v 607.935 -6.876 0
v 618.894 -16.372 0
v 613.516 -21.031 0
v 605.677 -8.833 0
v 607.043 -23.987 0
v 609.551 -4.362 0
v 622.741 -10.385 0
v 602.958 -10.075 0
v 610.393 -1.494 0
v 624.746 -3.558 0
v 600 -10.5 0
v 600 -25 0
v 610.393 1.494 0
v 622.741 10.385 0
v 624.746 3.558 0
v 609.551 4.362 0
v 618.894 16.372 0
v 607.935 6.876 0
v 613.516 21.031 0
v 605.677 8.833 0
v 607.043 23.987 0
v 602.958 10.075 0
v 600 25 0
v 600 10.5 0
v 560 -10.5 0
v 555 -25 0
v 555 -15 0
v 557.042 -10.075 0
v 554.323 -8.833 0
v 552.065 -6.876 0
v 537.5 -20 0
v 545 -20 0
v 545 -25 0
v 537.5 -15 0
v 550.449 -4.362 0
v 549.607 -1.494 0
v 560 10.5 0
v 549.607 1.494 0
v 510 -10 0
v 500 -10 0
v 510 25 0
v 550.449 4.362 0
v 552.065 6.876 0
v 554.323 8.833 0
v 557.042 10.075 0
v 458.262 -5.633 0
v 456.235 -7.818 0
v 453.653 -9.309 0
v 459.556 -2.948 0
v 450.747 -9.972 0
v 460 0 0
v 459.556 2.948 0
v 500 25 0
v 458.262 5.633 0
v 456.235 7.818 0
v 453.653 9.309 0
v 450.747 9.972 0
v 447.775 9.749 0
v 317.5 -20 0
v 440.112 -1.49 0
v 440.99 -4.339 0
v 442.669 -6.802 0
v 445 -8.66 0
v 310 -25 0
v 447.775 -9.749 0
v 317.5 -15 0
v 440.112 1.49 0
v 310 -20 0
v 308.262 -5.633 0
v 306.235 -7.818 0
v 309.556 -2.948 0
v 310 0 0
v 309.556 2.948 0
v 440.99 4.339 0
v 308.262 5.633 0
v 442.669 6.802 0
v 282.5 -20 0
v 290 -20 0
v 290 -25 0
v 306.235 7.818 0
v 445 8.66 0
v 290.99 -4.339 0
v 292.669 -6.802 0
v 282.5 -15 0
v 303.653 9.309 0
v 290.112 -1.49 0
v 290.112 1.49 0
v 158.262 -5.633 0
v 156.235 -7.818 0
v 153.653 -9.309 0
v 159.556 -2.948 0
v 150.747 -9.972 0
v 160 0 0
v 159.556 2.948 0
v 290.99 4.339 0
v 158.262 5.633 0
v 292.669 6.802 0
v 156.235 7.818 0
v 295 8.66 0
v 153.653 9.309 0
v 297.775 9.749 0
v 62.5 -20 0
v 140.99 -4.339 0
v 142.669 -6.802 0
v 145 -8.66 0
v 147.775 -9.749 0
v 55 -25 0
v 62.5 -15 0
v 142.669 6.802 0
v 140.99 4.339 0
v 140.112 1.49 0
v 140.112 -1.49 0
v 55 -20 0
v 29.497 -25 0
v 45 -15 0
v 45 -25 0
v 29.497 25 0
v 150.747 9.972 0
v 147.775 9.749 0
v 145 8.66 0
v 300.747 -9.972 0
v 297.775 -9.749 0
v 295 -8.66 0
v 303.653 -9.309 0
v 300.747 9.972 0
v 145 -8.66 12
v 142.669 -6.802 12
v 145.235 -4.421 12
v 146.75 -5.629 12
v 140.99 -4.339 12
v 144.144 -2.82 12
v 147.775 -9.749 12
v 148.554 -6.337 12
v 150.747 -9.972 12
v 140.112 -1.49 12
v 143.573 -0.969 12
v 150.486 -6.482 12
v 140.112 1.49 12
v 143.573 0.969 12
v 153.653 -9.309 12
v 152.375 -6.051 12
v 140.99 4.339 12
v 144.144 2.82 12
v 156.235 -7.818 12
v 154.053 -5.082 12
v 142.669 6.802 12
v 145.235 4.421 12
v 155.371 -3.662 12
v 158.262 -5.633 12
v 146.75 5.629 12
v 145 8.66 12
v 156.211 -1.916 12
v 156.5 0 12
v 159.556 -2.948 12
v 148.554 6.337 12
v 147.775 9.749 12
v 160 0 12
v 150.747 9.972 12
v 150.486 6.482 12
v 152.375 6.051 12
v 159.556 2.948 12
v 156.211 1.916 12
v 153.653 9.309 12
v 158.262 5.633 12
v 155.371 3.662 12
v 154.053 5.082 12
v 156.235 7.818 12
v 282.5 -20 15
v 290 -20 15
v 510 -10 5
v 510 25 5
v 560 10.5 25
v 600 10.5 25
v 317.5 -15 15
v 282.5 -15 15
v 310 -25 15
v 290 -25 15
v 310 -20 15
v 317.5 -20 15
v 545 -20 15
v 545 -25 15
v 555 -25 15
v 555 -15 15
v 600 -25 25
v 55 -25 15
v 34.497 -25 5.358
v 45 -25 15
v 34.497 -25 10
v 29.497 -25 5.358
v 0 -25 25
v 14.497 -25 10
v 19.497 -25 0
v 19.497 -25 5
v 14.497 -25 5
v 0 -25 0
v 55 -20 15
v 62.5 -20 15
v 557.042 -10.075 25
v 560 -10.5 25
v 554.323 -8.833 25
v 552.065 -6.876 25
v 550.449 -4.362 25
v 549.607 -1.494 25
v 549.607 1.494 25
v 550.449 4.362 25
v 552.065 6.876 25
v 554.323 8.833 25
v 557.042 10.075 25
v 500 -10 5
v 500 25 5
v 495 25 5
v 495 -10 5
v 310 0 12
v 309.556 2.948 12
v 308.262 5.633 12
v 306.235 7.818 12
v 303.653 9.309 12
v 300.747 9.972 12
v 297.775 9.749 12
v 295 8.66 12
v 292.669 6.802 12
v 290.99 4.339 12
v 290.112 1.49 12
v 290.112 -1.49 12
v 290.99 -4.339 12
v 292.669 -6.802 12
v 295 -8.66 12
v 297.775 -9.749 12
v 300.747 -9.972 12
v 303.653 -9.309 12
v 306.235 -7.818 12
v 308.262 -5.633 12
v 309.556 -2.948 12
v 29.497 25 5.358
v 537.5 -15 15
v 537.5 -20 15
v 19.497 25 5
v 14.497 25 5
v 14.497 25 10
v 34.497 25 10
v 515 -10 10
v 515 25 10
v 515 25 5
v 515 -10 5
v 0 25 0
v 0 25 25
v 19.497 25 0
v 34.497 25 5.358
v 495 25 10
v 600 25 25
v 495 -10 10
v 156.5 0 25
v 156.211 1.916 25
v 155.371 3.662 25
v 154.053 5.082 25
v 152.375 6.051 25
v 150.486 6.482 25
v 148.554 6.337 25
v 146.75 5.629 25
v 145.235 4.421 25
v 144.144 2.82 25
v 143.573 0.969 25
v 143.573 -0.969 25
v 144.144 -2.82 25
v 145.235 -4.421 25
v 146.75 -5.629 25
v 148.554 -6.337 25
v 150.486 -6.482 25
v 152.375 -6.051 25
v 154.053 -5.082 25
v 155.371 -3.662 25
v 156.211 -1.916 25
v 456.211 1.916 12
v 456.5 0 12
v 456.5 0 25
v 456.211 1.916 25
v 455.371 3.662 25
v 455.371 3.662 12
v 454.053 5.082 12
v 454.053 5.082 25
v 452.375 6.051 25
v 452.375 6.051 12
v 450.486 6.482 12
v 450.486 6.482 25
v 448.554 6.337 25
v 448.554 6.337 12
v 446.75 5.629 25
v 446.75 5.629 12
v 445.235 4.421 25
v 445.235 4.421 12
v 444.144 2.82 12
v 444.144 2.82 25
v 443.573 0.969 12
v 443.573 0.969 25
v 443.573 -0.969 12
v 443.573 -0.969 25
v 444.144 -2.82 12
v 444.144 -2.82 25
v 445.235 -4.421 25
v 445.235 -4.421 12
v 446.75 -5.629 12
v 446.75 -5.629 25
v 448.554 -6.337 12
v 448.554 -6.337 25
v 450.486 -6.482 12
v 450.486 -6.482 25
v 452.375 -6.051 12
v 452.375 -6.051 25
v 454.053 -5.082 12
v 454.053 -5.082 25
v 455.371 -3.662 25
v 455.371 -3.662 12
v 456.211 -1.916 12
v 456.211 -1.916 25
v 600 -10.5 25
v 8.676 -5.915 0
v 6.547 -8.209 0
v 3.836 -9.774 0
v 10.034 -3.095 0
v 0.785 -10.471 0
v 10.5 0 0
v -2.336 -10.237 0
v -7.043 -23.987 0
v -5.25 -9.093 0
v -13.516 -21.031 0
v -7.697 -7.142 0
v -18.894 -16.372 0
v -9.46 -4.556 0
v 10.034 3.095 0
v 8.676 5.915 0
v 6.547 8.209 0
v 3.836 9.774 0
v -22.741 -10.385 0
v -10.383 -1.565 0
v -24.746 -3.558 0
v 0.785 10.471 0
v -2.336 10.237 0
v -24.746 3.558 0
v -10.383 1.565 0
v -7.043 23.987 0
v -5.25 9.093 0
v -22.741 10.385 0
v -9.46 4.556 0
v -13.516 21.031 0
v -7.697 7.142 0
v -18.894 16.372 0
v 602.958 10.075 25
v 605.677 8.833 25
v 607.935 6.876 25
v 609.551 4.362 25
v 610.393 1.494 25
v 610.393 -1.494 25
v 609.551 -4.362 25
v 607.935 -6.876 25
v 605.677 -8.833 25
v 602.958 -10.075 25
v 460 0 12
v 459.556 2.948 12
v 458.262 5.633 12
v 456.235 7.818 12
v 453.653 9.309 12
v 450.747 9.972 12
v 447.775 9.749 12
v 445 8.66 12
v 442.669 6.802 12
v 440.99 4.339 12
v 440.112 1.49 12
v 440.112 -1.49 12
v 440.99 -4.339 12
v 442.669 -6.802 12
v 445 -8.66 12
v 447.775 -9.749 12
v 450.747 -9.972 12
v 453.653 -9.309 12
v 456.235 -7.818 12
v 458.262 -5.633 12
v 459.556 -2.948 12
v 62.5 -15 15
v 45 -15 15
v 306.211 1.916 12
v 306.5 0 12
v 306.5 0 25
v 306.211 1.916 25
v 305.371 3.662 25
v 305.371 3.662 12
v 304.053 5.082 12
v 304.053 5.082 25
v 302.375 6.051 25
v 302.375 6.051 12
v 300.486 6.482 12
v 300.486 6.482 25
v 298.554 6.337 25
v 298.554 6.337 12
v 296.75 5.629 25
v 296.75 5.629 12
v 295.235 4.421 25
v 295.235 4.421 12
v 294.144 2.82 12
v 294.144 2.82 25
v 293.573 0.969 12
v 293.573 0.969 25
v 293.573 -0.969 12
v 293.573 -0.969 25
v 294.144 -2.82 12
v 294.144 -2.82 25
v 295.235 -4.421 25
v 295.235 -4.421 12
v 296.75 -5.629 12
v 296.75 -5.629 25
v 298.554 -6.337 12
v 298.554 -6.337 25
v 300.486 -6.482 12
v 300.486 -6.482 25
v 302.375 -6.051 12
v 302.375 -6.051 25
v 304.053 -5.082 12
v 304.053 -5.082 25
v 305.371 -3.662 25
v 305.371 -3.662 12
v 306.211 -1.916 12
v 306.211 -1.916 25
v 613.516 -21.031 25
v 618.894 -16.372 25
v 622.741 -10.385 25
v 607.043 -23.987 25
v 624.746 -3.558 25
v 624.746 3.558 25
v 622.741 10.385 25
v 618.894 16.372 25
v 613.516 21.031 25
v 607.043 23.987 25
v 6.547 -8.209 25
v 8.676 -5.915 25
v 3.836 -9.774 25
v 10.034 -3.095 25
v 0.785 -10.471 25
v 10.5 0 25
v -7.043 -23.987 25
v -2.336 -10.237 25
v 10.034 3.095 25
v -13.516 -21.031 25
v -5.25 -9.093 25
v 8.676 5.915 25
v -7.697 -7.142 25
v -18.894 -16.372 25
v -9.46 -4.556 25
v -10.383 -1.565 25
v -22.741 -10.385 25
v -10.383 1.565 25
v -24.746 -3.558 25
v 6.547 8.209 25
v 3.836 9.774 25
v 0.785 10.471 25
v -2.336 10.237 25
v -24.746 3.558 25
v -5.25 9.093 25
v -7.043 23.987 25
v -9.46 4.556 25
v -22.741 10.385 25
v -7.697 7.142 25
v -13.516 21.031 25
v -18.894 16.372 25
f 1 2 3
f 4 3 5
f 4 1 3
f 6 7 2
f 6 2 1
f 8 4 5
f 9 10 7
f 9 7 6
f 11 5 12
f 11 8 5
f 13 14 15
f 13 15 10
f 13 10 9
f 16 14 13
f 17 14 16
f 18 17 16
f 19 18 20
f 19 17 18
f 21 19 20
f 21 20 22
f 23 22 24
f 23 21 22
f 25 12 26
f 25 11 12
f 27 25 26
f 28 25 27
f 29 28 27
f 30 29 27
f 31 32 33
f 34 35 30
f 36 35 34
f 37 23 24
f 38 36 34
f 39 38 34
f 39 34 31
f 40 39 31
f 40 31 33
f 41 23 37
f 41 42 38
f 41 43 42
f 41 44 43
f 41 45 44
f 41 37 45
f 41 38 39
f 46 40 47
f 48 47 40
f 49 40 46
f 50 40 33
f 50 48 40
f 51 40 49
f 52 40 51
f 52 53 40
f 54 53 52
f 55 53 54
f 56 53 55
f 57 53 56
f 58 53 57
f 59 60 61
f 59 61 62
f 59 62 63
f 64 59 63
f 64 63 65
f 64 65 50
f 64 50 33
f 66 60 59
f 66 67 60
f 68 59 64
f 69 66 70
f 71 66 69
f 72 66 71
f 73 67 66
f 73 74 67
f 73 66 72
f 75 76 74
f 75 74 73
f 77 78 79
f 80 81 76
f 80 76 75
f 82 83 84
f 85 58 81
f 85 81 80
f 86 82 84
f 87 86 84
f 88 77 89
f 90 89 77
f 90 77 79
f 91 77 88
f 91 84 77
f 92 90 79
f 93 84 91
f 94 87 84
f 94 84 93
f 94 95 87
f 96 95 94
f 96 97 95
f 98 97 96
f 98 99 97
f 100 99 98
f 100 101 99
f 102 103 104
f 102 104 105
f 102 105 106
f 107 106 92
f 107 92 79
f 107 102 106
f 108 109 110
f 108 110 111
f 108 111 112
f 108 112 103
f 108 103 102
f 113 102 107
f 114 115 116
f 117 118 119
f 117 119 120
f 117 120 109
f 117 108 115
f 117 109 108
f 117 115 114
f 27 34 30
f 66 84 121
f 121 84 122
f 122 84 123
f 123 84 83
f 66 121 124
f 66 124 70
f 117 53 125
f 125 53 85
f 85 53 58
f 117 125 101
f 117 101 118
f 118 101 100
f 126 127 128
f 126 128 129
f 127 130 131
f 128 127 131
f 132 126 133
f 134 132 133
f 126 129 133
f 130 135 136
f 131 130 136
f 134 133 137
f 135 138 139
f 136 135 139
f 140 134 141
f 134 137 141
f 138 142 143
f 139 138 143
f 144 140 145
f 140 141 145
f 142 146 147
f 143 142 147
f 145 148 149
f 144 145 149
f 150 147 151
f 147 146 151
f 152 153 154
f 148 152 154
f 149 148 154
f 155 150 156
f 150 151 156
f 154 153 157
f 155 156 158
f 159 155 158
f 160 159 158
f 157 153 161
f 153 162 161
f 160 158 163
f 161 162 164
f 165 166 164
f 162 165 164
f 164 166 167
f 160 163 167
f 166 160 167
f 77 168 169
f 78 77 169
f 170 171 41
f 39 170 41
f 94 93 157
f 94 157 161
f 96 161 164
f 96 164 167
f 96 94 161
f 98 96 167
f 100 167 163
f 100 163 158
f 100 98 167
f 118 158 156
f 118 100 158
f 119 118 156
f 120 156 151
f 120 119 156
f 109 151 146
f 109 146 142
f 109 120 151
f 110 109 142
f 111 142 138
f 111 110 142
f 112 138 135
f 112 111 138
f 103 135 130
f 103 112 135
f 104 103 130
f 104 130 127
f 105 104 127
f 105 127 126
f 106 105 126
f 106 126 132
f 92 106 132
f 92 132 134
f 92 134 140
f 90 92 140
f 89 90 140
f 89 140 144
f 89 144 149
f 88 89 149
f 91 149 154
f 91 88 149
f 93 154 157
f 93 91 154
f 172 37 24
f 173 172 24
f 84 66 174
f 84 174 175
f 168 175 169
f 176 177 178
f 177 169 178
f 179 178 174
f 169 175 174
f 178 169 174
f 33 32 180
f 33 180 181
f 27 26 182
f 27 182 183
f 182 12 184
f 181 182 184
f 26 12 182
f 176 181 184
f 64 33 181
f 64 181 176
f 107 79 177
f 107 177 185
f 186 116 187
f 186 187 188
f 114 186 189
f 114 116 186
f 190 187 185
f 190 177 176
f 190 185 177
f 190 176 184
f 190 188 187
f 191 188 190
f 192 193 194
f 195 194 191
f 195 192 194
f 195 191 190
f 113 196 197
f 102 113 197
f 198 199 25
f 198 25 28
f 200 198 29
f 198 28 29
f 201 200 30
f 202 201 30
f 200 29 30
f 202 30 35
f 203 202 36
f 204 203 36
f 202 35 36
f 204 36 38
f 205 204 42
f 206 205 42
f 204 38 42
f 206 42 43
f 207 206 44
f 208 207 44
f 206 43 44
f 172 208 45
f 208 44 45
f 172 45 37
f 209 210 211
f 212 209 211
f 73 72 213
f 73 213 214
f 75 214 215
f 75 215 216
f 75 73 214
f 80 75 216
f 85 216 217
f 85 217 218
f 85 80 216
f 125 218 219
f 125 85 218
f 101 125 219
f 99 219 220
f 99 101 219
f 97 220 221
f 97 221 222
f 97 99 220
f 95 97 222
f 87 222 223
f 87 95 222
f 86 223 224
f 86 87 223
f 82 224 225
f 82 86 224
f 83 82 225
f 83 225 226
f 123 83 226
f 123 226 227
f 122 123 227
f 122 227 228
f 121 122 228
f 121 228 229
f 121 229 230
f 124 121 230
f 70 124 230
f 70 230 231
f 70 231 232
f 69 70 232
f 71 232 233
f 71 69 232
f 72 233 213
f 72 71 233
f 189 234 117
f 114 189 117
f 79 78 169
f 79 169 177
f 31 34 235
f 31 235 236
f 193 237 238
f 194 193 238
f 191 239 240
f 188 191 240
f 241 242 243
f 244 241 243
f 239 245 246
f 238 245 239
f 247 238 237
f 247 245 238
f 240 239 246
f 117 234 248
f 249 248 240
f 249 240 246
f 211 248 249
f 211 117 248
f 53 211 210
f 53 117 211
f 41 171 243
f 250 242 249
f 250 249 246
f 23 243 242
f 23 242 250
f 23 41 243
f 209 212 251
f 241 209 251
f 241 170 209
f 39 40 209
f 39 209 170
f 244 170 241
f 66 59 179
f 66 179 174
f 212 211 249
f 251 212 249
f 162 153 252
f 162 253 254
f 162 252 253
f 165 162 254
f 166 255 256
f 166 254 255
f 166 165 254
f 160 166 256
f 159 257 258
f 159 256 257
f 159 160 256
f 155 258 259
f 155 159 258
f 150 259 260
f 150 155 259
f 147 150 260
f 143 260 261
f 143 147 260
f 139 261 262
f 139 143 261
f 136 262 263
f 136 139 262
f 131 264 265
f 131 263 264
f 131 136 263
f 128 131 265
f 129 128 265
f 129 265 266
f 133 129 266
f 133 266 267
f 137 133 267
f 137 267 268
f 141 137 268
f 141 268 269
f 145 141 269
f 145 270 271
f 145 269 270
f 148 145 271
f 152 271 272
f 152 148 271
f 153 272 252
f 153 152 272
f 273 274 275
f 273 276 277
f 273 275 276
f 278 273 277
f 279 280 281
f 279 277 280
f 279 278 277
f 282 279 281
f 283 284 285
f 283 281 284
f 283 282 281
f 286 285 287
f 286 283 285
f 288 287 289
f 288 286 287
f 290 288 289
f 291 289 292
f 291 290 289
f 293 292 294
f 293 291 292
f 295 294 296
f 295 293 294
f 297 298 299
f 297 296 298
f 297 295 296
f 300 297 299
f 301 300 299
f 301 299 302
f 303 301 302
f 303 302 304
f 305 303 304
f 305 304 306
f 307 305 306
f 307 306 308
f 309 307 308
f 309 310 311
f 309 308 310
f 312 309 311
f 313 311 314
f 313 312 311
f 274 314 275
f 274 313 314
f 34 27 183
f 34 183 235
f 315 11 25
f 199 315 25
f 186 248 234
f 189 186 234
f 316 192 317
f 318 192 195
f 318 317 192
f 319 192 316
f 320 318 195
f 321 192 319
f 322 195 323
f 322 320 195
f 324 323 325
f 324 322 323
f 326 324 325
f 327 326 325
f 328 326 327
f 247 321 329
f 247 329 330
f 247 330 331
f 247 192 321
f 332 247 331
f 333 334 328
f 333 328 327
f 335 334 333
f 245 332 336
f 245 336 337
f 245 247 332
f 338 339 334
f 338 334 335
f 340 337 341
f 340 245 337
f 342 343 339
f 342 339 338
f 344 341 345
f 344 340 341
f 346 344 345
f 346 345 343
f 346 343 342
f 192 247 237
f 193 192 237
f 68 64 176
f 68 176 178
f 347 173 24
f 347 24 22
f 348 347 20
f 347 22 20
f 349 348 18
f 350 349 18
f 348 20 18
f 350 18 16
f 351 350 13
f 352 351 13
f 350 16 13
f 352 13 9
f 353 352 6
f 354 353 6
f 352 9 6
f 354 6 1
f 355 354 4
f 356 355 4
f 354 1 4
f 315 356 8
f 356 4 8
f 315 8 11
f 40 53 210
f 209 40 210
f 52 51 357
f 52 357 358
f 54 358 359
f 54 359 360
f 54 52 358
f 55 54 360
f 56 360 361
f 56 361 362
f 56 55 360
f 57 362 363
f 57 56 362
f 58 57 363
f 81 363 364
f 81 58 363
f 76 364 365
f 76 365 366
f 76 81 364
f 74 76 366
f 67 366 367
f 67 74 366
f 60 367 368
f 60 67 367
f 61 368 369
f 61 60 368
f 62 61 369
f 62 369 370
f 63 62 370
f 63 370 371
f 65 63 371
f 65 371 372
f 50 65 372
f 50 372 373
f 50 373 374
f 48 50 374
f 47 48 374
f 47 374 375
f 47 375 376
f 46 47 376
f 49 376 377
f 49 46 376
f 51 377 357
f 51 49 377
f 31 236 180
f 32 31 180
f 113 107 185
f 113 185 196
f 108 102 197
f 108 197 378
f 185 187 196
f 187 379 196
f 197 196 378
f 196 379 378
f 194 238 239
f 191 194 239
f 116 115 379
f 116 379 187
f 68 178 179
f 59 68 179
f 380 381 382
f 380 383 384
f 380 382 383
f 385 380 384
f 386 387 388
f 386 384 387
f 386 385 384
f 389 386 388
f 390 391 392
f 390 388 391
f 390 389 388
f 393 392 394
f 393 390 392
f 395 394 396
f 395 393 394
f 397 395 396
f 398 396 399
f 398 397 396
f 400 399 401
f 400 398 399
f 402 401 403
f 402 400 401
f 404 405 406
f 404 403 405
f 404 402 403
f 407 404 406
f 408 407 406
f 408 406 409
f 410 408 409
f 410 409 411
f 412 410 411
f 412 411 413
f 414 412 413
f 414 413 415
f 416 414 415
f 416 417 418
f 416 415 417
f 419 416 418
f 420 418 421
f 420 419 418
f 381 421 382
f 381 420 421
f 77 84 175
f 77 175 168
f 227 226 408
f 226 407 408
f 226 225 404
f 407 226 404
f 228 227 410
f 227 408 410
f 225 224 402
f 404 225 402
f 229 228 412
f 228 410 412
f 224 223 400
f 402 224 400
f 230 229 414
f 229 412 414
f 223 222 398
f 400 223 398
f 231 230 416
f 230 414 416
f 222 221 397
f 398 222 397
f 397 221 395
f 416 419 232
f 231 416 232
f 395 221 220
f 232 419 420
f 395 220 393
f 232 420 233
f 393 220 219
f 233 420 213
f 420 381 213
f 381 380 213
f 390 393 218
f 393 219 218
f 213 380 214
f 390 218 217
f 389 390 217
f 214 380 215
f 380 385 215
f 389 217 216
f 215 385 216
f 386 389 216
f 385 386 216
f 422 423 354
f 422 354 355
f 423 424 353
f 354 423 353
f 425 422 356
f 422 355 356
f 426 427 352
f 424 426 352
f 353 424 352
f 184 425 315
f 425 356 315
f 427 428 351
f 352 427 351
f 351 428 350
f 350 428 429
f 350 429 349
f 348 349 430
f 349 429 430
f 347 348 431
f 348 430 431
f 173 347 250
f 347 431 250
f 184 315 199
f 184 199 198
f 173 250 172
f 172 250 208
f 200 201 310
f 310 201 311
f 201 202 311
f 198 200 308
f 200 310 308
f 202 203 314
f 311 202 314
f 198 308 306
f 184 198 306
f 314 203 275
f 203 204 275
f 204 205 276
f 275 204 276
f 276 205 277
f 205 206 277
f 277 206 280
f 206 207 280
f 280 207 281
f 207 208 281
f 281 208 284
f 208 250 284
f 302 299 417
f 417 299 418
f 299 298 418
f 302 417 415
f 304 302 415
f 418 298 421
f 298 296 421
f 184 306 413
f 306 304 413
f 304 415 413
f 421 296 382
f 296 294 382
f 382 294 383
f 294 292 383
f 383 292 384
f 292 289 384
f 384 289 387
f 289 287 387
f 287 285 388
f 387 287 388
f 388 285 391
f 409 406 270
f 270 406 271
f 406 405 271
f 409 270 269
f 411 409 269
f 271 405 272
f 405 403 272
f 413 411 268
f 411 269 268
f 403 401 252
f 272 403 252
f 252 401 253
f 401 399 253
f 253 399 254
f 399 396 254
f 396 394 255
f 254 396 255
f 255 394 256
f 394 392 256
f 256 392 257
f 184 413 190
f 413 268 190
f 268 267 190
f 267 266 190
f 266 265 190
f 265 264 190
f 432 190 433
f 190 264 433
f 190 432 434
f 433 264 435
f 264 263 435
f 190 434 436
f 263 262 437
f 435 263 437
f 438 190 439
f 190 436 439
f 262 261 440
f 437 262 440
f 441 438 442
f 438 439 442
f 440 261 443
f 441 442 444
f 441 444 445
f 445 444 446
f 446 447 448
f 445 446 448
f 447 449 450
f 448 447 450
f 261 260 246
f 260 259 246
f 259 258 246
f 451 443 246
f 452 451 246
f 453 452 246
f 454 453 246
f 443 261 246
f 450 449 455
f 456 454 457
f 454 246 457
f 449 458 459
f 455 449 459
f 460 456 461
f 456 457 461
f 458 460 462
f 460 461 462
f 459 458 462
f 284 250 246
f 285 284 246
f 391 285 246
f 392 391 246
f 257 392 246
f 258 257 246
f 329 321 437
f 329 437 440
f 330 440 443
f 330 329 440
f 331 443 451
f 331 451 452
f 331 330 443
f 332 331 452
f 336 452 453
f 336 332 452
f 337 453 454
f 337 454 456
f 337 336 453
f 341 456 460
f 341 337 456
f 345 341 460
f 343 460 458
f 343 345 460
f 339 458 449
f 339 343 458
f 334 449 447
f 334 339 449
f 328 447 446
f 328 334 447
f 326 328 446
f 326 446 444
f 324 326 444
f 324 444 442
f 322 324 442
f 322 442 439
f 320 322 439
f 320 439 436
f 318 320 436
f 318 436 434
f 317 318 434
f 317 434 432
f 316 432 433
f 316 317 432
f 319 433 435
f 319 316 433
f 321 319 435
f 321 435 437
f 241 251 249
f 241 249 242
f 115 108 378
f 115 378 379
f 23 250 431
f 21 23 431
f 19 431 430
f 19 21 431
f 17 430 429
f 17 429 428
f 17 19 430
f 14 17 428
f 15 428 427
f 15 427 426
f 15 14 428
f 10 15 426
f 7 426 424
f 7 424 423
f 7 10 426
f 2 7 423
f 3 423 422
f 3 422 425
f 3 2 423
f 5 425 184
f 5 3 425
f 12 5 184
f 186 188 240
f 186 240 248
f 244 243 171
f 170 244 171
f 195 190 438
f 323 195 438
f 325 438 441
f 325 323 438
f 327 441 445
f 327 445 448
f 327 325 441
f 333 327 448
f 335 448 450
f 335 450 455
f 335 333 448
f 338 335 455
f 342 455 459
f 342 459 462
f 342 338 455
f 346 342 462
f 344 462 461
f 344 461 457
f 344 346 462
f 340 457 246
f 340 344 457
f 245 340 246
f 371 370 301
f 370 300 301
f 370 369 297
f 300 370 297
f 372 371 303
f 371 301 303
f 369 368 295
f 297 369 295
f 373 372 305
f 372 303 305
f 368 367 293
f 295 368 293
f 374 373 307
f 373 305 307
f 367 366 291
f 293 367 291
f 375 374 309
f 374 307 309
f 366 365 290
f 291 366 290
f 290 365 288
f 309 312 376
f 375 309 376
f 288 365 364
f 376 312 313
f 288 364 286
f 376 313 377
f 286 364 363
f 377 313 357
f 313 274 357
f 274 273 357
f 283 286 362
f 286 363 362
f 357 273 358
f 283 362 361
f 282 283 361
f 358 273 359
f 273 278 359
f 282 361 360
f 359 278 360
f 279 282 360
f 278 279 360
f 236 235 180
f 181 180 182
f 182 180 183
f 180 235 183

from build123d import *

# Parameters (mm, degrees)
ESQUISSE1_R             = 10.5
BOSS_EXTRU_1_DEPTH      = 25
ENL_V_MAT_EXTRU_1_DEPTH = 35
ENL_V_MAT_EXTRU_2_DEPTH = 50
ENL_V_MAT_EXTRU_3_DEPTH = 15
ESQUISSE1_4_R           = 6.5
ENL_V_MAT_EXTRU_4_DEPTH = 626.999201277
ESQUISSE1_5_R           = 10
ENL_V_MAT_EXTRU_5_DEPTH = 12


with BuildPart() as part:
    # Esquisse1 → Boss.-Extru.1 (new body)
    with BuildSketch(Plane.XY):
        with BuildLine():
            Line((600, -25), (0, -25))
            ThreePointArc((0, -25), (-25, 0), (0, 25))
            Line((0, 25), (600, 25))
            ThreePointArc((600, 25), (625, 0), (600, -25))
        make_face()
        Circle(ESQUISSE1_R, mode=Mode.SUBTRACT)
        with BuildLine():
            Line((560, 10.5), (600, 10.5))
            ThreePointArc((600, 10.5), (610.5, 0), (600, -10.5))
            Line((600, -10.5), (560, -10.5))
            ThreePointArc((560, -10.5), (549.5, 0), (560, 10.5))
        make_face(mode=Mode.SUBTRACT)
    extrude(amount=BOSS_EXTRU_1_DEPTH)

    # Esquisse2 → Enl_v. mat.-Extru.1 (cut)
    with BuildSketch(Plane(origin=(0, 25, 0), x_dir=(1, 0, 0), z_dir=(0, 1, 0))):
        Polygon((510, 0), (500, 0), (500, -5), (495, -5), (495, -10), (515, -10), (515, -5), (510, -5), align=None)
    extrude(amount=-ENL_V_MAT_EXTRU_1_DEPTH, mode=Mode.SUBTRACT)

    # Esquisse3 → Enl_v. mat.-Extru.2 (cut)
    with BuildSketch(Plane(origin=(0, 25, 0), x_dir=(1, 0, 0), z_dir=(0, 1, 0))):
        Polygon((19.49708464, 0), (19.49708464, -5), (14.49708464, -5), (14.49708464, -10), (34.49708464, -10), (34.49708464, -5.357949986), (29.49708464, -5.357949986), (29.49708464, 0), align=None)
    extrude(amount=-ENL_V_MAT_EXTRU_2_DEPTH, mode=Mode.SUBTRACT)

    # Esquisse1_3 → Enl_v. mat.-Extru.3 (cut)
    with BuildSketch(Plane.XY):
        Polygon((545, -25), (555, -25), (555, -15), (537.5, -15), (537.5, -20), (545, -20), align=None)
        Polygon((290, -25), (310, -25), (310, -20), (317.5, -20), (317.5, -15), (282.5, -15), (282.5, -20), (290, -20), align=None)
        Polygon((45, -15), (45, -25), (55, -25), (55, -20), (62.5, -20), (62.5, -15), align=None)
    extrude(amount=ENL_V_MAT_EXTRU_3_DEPTH, mode=Mode.SUBTRACT)

    # Esquisse1_4 → Enl_v. mat.-Extru.4 (cut, through all)
    with BuildSketch(Plane.XY):
        with Locations((300, 0)):
            Circle(ESQUISSE1_4_R)
        with Locations((450, 0)):
            Circle(ESQUISSE1_4_R)
        with Locations((150, 0)):
            Circle(ESQUISSE1_4_R)
    extrude(amount=ENL_V_MAT_EXTRU_4_DEPTH, mode=Mode.SUBTRACT)

    # Esquisse1_5 → Enl_v. mat.-Extru.5 (cut)
    with BuildSketch(Plane.XY):
        with Locations((300, 0)):
            Circle(ESQUISSE1_5_R)
        with Locations((450, 0)):
            Circle(ESQUISSE1_5_R)
        with Locations((150, 0)):
            Circle(ESQUISSE1_5_R)
    extrude(amount=ENL_V_MAT_EXTRU_5_DEPTH, mode=Mode.SUBTRACT)


solid = part.part
